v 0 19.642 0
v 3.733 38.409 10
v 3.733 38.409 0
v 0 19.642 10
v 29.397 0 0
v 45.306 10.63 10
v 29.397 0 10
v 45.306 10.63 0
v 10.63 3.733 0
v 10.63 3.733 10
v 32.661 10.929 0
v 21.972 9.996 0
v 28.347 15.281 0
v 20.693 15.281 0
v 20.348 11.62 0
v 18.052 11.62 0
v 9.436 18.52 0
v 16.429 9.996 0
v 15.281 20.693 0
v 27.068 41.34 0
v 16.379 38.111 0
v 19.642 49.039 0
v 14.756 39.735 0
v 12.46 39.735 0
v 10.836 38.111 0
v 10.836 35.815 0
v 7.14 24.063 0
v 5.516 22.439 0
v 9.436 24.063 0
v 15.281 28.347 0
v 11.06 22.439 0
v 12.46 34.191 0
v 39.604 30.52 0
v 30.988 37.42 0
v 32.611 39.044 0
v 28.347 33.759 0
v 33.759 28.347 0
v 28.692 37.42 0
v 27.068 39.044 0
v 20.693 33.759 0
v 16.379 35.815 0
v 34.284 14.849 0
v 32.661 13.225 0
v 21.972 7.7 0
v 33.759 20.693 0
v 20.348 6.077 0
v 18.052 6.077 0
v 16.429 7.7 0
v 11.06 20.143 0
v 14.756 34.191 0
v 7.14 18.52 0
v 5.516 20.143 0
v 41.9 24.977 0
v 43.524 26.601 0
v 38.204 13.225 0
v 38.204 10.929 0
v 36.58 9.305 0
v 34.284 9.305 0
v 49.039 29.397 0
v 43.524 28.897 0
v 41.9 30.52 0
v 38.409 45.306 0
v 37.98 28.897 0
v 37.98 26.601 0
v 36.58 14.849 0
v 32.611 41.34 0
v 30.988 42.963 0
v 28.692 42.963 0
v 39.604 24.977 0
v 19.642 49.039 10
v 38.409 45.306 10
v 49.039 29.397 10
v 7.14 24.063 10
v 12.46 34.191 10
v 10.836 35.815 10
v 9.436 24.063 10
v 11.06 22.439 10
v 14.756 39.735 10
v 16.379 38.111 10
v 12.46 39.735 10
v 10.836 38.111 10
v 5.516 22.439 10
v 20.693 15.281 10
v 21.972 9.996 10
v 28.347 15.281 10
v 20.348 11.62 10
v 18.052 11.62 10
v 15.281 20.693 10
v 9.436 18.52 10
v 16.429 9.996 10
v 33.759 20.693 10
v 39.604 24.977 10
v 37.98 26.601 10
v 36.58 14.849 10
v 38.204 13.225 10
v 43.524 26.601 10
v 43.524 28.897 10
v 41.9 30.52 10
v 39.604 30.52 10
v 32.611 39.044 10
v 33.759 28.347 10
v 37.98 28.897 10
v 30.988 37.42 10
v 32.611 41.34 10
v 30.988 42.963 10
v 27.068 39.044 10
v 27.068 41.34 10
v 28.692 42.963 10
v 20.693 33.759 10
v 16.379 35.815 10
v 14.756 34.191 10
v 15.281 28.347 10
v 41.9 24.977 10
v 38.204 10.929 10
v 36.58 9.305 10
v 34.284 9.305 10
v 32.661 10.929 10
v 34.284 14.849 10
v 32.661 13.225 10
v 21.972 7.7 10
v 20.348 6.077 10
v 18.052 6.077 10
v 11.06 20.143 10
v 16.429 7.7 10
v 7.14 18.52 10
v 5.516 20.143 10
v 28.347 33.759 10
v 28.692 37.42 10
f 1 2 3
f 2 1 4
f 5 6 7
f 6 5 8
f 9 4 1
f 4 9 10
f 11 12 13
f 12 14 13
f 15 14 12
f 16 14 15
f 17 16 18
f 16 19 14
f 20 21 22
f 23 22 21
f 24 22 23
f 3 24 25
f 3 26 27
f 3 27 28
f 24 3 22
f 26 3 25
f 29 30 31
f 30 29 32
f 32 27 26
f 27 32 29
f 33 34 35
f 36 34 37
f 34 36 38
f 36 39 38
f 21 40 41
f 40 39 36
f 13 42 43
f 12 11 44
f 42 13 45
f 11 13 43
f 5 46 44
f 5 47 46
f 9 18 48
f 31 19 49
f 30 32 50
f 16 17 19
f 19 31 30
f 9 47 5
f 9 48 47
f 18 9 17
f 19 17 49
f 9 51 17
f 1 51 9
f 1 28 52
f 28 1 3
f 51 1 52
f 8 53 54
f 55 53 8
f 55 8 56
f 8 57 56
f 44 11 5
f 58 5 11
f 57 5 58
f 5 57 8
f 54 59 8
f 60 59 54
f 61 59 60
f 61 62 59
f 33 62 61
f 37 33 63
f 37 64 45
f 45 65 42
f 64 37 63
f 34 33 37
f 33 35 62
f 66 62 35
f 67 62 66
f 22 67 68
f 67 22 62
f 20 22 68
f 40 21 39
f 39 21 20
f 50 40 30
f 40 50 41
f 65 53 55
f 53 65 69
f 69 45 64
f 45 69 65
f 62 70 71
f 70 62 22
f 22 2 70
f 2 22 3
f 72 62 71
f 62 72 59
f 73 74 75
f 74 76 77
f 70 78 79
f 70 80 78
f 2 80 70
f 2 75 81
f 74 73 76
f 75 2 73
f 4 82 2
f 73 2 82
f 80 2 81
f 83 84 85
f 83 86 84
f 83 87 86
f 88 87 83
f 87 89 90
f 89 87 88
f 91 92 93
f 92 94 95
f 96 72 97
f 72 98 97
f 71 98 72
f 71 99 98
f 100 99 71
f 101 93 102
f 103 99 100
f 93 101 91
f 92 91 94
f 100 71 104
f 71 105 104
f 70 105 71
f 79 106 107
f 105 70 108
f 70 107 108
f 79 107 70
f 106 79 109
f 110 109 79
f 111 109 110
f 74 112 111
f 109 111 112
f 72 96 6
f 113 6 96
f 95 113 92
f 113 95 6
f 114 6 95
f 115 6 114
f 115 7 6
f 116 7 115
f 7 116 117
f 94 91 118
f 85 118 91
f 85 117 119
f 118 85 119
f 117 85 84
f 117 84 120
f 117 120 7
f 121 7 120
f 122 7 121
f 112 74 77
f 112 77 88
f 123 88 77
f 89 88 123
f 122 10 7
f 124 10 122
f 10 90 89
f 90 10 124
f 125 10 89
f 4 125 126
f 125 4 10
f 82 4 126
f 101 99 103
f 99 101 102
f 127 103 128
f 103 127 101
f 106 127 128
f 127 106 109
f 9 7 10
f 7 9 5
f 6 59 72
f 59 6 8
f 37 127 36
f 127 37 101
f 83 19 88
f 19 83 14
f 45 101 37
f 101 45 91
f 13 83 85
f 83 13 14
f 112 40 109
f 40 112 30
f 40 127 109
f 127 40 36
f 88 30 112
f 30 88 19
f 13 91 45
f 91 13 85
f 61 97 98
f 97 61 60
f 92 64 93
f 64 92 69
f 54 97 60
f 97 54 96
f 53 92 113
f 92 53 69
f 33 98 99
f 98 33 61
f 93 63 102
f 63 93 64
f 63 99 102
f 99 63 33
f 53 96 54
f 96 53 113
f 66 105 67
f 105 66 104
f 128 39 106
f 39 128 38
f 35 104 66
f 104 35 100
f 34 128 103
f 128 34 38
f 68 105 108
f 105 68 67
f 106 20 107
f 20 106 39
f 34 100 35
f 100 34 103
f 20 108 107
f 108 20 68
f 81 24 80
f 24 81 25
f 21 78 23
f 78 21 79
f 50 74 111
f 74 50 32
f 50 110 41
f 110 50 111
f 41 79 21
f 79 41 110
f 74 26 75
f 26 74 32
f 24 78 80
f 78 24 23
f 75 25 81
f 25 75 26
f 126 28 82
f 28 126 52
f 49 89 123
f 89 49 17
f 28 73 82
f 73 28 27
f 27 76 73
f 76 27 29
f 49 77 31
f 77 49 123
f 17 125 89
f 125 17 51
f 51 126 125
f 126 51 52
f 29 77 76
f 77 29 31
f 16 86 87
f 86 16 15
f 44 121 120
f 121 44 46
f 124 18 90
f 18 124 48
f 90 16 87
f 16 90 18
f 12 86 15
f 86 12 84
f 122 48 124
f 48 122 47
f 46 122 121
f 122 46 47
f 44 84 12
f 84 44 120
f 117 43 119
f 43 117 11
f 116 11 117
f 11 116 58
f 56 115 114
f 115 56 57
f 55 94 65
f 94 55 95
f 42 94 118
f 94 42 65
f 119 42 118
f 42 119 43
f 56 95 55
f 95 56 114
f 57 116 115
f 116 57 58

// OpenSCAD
$fn = 32;

// ----------------------------------------------------------------------
// Polygon plate: 8-gon R25, 6 bolt windows
// ----------------------------------------------------------------------

// --- parameters (mm) ---
sides = 8;                // number of polygon sides
plate_r = 25;             // circumscribed radius of the polygon
bore_r = 10;              // centre bore radius
bolts = 6;                // number of bolt windows
ring_r = 16.55;           // bolt-circle radius
bolt_r = 3;               // bolt window radius
plate_t = 10;             // plate thickness, Z (extrusion height)

plate_d = 2 * plate_r;  // circumscribed diameter
bore_d = 2 * bore_r;  // centre bore diameter
bolt_d = 2 * bolt_r;  // bolt window diameter
ring_d = 2 * ring_r;  // bolt-circle diameter

profile = [[49.039, 29.397], [38.409, 45.306], [19.642, 49.039], [3.733, 38.409], [0, 19.642], [10.63, 3.733], [29.397, 0], [45.306, 10.63]];  // primary outline, 8 points, counter clockwise
void_1 = [[33.759, 28.347], [28.347, 33.759], [20.693, 33.759], [15.281, 28.347], [15.281, 20.693], [20.693, 15.281], [28.347, 15.281], [33.759, 20.693]];  // centre bore, 8 points
void_2 = [[43.524, 28.897], [41.9, 30.52], [39.604, 30.52], [37.98, 28.897], [37.98, 26.601], [39.604, 24.977], [41.9, 24.977], [43.524, 26.601]];  // bolt window 1, 8 points
void_3 = [[32.611, 41.34], [30.988, 42.963], [28.692, 42.963], [27.068, 41.34], [27.068, 39.044], [28.692, 37.42], [30.988, 37.42], [32.611, 39.044]];  // bolt window 2, 8 points
void_4 = [[16.379, 38.111], [14.756, 39.735], [12.46, 39.735], [10.836, 38.111], [10.836, 35.815], [12.46, 34.191], [14.756, 34.191], [16.379, 35.815]];  // bolt window 3, 8 points
void_5 = [[11.06, 22.439], [9.436, 24.063], [7.14, 24.063], [5.516, 22.439], [5.516, 20.143], [7.14, 18.52], [9.436, 18.52], [11.06, 20.143]];  // bolt window 4, 8 points
void_6 = [[21.972, 9.996], [20.348, 11.62], [18.052, 11.62], [16.429, 9.996], [16.429, 7.7], [18.052, 6.077], [20.348, 6.077], [21.972, 7.7]];  // bolt window 5, 8 points
void_7 = [[38.204, 13.225], [36.58, 14.849], [34.284, 14.849], [32.661, 13.225], [32.661, 10.929], [34.284, 9.305], [36.58, 9.305], [38.204, 10.929]];  // bolt window 6, 8 points

// --- the one profile operation ---
difference() {
  linear_extrude(height = plate_t) polygon(points = profile);
  translate([0, 0, -1])
    linear_extrude(height = plate_t + 2) polygon(points = void_1);
  translate([0, 0, -1])
    linear_extrude(height = plate_t + 2) polygon(points = void_2);
  translate([0, 0, -1])
    linear_extrude(height = plate_t + 2) polygon(points = void_3);
  translate([0, 0, -1])
    linear_extrude(height = plate_t + 2) polygon(points = void_4);
  translate([0, 0, -1])
    linear_extrude(height = plate_t + 2) polygon(points = void_5);
  translate([0, 0, -1])
    linear_extrude(height = plate_t + 2) polygon(points = void_6);
  translate([0, 0, -1])
    linear_extrude(height = plate_t + 2) polygon(points = void_7);
}
